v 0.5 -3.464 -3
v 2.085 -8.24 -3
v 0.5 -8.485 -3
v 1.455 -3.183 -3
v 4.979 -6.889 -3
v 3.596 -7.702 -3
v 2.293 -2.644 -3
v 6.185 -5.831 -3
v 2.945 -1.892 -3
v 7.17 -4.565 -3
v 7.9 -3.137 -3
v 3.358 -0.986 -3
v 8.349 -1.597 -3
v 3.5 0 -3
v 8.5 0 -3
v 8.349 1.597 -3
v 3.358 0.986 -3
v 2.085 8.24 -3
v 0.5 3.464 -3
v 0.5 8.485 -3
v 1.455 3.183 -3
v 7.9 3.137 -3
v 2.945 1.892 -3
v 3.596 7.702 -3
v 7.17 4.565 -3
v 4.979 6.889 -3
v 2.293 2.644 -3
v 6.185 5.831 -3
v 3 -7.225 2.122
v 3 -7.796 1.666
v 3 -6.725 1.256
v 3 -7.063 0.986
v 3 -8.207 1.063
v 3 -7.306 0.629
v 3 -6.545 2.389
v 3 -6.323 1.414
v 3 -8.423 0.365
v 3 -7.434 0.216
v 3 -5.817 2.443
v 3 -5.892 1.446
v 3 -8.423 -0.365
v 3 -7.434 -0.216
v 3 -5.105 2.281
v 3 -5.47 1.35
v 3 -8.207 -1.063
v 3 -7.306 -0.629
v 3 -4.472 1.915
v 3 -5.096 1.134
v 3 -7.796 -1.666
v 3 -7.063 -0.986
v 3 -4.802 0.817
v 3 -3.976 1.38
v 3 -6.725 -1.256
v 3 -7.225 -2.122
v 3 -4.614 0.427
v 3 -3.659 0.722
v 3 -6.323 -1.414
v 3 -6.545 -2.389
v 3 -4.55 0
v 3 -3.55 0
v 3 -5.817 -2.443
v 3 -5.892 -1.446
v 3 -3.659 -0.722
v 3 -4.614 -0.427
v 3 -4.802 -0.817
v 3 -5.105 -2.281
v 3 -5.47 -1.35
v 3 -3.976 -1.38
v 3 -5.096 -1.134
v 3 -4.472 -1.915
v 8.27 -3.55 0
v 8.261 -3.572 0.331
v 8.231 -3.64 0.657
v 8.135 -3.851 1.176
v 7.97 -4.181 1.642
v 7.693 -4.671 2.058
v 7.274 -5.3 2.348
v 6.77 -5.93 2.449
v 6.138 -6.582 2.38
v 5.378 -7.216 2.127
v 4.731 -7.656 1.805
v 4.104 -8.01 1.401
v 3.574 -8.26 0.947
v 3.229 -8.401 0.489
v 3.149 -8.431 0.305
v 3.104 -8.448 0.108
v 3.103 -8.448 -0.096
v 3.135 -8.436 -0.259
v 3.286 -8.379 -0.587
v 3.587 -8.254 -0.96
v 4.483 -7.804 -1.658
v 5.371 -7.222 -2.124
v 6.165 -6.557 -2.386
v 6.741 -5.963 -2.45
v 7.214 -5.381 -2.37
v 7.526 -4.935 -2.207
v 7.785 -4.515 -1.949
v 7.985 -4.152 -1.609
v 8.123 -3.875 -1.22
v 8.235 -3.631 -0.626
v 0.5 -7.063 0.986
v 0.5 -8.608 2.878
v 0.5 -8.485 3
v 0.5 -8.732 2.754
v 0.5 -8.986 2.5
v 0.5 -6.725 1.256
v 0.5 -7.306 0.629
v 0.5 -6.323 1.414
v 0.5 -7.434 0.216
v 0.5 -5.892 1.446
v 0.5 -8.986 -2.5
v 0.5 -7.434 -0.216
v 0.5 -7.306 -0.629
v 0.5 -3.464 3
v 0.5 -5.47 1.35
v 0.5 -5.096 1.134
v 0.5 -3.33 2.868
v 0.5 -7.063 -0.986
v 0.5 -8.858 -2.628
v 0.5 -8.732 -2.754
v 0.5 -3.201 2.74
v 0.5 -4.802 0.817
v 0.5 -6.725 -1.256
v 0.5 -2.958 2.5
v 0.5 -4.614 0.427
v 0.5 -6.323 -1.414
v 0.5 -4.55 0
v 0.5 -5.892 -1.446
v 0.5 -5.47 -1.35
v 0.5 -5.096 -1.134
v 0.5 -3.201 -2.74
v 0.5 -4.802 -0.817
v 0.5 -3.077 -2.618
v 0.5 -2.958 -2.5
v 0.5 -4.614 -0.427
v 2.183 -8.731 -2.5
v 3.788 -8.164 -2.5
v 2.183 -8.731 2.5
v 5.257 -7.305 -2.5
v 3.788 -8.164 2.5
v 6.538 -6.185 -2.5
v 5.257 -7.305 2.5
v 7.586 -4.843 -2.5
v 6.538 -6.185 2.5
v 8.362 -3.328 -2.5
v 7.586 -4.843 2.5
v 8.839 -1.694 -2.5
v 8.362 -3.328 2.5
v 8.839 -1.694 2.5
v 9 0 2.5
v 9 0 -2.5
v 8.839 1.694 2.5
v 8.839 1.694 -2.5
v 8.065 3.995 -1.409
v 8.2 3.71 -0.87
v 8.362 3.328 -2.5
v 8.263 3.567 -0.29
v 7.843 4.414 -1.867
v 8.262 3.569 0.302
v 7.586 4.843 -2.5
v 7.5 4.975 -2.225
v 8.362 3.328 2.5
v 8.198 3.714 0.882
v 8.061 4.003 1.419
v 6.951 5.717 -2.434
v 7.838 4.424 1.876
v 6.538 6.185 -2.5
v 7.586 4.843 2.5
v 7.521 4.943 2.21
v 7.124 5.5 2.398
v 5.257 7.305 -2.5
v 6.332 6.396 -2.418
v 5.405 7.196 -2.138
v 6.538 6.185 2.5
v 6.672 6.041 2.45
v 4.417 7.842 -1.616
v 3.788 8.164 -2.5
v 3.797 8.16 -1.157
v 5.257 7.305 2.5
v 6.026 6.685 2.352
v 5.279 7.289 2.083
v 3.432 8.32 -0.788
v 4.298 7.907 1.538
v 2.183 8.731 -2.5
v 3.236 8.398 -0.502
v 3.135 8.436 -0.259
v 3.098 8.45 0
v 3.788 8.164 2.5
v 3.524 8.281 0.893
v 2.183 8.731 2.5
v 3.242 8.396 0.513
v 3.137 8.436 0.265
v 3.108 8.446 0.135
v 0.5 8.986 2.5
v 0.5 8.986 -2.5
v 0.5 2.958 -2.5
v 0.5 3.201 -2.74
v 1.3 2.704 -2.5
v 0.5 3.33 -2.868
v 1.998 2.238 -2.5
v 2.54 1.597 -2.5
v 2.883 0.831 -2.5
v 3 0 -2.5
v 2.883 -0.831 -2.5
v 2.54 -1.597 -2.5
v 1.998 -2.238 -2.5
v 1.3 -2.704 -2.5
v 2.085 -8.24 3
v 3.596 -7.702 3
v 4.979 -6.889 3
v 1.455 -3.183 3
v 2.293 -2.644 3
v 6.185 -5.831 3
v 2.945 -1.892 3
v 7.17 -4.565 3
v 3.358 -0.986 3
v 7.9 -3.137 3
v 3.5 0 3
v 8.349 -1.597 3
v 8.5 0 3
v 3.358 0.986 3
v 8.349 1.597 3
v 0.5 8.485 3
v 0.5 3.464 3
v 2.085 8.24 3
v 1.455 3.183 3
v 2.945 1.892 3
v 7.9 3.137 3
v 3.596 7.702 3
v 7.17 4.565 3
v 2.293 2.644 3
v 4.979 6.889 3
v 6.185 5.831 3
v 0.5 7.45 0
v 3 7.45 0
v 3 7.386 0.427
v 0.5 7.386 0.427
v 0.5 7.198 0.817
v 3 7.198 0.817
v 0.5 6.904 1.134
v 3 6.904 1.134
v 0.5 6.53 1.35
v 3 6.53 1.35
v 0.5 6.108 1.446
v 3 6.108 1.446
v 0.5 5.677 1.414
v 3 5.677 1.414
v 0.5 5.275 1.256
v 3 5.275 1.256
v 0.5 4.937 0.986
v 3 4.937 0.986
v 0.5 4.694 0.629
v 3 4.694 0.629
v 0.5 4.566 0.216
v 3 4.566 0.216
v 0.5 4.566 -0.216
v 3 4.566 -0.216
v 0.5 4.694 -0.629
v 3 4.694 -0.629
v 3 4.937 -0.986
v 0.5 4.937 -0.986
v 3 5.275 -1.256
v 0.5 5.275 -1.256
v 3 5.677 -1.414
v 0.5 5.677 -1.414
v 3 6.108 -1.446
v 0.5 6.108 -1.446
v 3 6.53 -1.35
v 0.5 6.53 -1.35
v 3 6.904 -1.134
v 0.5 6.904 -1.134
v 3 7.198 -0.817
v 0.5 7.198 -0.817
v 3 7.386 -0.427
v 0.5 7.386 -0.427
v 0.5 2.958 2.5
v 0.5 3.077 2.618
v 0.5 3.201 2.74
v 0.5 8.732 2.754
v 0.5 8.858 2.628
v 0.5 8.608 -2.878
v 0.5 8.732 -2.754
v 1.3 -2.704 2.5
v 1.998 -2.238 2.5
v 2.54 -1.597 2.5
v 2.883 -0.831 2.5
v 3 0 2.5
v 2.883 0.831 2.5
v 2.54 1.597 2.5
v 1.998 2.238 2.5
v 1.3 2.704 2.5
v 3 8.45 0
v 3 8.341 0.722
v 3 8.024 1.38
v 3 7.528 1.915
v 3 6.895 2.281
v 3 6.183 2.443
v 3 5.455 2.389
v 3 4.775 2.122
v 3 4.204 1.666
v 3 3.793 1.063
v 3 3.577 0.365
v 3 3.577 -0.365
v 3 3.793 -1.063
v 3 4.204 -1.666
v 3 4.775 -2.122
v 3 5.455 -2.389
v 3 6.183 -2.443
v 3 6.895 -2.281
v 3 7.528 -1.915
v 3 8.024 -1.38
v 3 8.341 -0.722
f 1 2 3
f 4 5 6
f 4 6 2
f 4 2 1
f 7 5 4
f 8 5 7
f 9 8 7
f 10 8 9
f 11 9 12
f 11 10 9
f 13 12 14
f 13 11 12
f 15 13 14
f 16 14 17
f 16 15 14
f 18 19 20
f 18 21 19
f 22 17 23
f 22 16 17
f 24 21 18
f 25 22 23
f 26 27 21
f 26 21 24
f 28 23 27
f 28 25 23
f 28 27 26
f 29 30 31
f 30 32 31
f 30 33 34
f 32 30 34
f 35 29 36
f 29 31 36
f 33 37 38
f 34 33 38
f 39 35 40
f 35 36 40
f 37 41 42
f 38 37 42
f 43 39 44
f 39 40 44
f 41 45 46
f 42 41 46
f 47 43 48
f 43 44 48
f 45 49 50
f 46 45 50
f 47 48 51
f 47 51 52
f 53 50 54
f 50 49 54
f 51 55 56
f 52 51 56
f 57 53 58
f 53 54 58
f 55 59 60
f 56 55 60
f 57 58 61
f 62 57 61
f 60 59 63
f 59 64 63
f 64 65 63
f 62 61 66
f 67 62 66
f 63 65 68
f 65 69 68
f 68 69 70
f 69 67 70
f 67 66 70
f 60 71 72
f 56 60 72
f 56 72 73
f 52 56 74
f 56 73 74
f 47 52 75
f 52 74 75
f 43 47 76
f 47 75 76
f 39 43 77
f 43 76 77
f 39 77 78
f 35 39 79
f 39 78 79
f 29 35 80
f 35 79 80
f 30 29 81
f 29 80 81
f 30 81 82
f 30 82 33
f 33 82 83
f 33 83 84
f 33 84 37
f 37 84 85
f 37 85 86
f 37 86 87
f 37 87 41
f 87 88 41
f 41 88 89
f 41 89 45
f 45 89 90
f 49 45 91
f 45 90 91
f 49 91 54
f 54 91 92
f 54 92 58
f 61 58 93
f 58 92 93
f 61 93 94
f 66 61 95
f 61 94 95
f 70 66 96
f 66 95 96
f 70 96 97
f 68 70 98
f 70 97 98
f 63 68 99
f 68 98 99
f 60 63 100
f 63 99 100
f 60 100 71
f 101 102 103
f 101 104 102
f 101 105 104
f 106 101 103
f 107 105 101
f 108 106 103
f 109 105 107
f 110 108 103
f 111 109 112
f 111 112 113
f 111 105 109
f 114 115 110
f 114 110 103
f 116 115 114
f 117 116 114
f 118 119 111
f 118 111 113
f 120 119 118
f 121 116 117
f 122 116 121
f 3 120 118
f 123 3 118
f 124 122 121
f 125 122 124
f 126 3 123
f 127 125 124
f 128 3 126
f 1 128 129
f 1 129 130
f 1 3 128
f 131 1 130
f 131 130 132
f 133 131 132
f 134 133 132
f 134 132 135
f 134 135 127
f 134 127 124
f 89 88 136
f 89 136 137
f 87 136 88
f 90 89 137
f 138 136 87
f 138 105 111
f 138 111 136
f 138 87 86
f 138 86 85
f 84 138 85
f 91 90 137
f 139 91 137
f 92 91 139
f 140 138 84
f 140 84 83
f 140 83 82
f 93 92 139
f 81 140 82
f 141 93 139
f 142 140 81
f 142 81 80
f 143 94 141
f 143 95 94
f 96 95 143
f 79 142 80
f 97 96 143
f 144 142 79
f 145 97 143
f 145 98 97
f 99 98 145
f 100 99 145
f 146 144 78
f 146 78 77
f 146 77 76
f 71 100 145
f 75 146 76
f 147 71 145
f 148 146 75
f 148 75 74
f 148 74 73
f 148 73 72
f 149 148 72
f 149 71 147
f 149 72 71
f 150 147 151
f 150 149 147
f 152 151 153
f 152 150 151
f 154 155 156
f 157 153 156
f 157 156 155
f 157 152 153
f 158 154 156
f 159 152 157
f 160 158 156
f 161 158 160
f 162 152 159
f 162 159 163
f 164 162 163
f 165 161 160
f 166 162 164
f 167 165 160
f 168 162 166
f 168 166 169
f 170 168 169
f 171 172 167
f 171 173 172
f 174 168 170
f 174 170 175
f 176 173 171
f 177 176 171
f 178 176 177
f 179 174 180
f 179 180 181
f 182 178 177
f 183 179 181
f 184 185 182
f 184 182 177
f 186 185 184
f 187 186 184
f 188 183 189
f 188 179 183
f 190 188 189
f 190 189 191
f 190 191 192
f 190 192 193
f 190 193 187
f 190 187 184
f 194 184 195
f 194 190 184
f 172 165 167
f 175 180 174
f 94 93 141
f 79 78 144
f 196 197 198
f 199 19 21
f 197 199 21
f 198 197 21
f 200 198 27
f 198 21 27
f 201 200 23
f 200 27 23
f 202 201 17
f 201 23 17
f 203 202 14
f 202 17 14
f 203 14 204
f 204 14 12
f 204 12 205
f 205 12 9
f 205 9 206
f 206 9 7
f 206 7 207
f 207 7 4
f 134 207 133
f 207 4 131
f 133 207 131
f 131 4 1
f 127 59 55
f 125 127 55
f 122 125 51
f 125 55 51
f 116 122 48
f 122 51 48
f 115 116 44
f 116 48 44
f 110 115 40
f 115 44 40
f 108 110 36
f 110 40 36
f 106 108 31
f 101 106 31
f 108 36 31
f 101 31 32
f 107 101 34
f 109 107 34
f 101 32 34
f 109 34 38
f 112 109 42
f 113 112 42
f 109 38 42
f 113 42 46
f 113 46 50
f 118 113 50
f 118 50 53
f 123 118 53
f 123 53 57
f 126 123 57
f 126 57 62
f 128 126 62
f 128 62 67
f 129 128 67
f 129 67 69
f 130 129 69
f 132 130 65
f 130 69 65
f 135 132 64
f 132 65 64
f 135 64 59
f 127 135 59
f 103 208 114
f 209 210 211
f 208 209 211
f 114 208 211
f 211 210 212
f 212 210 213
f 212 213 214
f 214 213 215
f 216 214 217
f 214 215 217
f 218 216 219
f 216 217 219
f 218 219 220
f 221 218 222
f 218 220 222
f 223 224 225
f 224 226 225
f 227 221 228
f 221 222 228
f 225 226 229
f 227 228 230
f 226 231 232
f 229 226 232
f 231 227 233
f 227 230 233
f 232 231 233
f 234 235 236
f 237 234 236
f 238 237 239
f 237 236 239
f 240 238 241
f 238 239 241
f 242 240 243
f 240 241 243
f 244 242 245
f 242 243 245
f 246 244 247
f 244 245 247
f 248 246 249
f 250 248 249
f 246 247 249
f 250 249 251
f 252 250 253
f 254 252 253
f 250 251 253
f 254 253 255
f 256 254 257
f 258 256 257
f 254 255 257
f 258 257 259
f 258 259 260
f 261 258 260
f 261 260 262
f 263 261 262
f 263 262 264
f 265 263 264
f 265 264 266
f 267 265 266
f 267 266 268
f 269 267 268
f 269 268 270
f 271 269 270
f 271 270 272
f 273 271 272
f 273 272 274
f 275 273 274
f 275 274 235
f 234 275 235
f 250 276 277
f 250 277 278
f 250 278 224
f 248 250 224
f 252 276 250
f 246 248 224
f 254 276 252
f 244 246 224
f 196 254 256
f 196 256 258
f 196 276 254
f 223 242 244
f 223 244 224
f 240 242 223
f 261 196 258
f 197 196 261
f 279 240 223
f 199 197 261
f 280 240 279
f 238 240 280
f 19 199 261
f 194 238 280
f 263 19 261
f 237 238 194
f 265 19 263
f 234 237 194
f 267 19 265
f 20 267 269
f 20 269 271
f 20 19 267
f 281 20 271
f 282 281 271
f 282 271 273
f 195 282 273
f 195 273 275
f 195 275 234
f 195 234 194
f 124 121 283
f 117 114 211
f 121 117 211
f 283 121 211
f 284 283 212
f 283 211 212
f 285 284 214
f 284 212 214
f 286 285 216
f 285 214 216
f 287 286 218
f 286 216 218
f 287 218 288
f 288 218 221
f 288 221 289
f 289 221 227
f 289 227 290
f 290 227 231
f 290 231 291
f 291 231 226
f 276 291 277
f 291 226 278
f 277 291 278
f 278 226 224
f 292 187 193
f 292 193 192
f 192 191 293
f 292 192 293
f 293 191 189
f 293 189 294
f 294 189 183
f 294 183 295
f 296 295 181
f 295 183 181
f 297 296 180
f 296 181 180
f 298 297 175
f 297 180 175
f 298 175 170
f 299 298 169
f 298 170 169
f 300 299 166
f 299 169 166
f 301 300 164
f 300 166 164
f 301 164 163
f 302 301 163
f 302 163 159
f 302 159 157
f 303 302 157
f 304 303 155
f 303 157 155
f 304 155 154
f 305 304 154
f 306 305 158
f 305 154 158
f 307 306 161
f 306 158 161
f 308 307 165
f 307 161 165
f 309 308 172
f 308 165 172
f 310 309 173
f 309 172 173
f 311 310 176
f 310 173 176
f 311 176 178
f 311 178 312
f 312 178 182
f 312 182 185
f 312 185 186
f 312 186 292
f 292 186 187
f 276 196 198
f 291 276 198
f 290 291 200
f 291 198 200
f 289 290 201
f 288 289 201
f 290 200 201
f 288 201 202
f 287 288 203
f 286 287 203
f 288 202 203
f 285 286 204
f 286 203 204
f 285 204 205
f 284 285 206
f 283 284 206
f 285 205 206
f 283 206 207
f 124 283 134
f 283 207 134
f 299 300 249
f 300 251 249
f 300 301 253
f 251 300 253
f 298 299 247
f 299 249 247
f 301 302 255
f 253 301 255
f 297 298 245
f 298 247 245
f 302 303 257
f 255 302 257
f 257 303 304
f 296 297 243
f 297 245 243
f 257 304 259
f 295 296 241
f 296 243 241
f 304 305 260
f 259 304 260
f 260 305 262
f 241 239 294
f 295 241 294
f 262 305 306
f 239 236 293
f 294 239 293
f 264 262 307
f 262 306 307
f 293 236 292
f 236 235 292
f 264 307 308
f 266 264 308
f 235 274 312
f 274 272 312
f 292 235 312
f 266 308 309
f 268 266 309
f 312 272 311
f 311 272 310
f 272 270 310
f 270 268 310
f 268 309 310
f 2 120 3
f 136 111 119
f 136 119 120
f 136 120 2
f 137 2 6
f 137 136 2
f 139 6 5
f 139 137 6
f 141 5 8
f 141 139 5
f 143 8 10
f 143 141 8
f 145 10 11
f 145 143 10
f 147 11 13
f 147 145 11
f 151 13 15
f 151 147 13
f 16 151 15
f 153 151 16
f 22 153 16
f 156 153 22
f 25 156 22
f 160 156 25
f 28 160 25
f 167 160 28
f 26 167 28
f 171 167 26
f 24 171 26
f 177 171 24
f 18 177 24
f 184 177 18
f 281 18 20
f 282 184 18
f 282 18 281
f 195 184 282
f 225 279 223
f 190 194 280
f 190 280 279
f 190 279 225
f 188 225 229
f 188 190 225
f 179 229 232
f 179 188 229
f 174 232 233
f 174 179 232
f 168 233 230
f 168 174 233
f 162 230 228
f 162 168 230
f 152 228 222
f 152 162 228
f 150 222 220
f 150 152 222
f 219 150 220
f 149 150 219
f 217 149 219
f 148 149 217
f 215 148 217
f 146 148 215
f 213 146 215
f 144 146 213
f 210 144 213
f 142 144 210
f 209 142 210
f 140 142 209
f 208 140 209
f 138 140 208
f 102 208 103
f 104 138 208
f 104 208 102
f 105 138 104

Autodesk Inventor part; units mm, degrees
sketch "Sketch_1" plane through (0, 0, 0) normal (1, 0, 0) x (0, 1, 0)
  line L0 (0, -3) -> (0, 3)
  line L1 (8.5, 3) -> (3.5, 3)
  line L2 (3.5, 3) -> (3, 2.5)
  line L3 (3, 2.5) -> (3, -2.5)
  line L4 (3, -2.5) -> (3.5, -3)
  line L5 (3.5, -3) -> (8.5, -3)
  line L6 (8.5, -3) -> (9, -2.5)
  line L7 (9, -2.5) -> (9, 2.5)
  line L8 (9, 2.5) -> (8.5, 3)
revolve "Revolution1" add sketch "Sketch_1" angle 180 about axis through (0, 0, -3) along (0, 0, -1)
sketch "Sketch_2" plane through (0, 0, 0) normal (0, 0, 1) x (1, 0, 0)
  line L0 (-0.5, -9) -> (0.5, -9)
  line L1 (0.5, -9) -> (0.5, 9)
  line L2 (0.5, 9) -> (-0.5, 9)
  line L3 (-0.5, 9) -> (-0.5, -9)
extrude "Extrusion1" cut sketch "Sketch_2" along normal mid plane 6
sketch "Sketch_3" plane through (0, 0, 0) normal (0, 0, 1) x (1, 0, 0)
  line L0 (9, -6) -> (0, -6)
  line L1 (0, -6) -> (0, -4.55)
  line L2 (0, -4.55) -> (3, -4.55)
  line L3 (3, -4.55) -> (3, -3.55)
  line L4 (3, -3.55) -> (9, -3.55)
  line L5 (9, -3.55) -> (9, -6)
  line L6 (9, -6) -> (0, -6)
revolve "Revolution2" cut sketch "Sketch_3" angle 360 about axis through (9, -6, 0) along (-1, 0, 0)
sketch "Sketch_4" plane through (0, 0, 0) normal (0, 0, 1) x (1, 0, 0)
  line L0 (9, 6) -> (0, 6)
  line L1 (0, 6) -> (0, 7.45)
  line L2 (0, 7.45) -> (3, 7.45)
  line L3 (3, 7.45) -> (3, 8.45)
  line L4 (3, 8.45) -> (9, 8.45)
  line L5 (9, 8.45) -> (9, 6)
  line L6 (9, 6) -> (0, 6)
revolve "Revolution3" cut sketch "Sketch_4" angle 360 about axis through (9, 6, 0) along (-1, 0, 0)
ref_plane "1_2_XY" through (0, 0, 0) normal (1, 0, 0) x (0, 0, -1)
ref_plane "1_2_YZ" through (0, 0, 0) normal (0, 0, -1) x (0, 1, 0)
ref_plane "1_2_ZX" through (0, 0, 0) normal (0, 1, 0) x (1, 0, 0)
ref_plane "body_screw_XY" through (3, -6, 0) normal (1, 0, 0) x (0, 0, -1)
ref_plane "body_screw_YZ" through (3, -6, 0) normal (0, 0, -1) x (0, 1, 0)
ref_plane "body_screw_ZX" through (3, -6, 0) normal (0, 1, 0) x (1, 0, 0)
ref_plane "body_screw2_XY" through (3, 6, 0) normal (1, 0, 0) x (0, 0, -1)
ref_plane "body_screw2_YZ" through (3, 6, 0) normal (0, 0, -1) x (0, 1, 0)
ref_plane "body_screw2_ZX" through (3, 6, 0) normal (0, 1, 0) x (1, 0, 0)
properties part number "PSCSPJ6-6b"
